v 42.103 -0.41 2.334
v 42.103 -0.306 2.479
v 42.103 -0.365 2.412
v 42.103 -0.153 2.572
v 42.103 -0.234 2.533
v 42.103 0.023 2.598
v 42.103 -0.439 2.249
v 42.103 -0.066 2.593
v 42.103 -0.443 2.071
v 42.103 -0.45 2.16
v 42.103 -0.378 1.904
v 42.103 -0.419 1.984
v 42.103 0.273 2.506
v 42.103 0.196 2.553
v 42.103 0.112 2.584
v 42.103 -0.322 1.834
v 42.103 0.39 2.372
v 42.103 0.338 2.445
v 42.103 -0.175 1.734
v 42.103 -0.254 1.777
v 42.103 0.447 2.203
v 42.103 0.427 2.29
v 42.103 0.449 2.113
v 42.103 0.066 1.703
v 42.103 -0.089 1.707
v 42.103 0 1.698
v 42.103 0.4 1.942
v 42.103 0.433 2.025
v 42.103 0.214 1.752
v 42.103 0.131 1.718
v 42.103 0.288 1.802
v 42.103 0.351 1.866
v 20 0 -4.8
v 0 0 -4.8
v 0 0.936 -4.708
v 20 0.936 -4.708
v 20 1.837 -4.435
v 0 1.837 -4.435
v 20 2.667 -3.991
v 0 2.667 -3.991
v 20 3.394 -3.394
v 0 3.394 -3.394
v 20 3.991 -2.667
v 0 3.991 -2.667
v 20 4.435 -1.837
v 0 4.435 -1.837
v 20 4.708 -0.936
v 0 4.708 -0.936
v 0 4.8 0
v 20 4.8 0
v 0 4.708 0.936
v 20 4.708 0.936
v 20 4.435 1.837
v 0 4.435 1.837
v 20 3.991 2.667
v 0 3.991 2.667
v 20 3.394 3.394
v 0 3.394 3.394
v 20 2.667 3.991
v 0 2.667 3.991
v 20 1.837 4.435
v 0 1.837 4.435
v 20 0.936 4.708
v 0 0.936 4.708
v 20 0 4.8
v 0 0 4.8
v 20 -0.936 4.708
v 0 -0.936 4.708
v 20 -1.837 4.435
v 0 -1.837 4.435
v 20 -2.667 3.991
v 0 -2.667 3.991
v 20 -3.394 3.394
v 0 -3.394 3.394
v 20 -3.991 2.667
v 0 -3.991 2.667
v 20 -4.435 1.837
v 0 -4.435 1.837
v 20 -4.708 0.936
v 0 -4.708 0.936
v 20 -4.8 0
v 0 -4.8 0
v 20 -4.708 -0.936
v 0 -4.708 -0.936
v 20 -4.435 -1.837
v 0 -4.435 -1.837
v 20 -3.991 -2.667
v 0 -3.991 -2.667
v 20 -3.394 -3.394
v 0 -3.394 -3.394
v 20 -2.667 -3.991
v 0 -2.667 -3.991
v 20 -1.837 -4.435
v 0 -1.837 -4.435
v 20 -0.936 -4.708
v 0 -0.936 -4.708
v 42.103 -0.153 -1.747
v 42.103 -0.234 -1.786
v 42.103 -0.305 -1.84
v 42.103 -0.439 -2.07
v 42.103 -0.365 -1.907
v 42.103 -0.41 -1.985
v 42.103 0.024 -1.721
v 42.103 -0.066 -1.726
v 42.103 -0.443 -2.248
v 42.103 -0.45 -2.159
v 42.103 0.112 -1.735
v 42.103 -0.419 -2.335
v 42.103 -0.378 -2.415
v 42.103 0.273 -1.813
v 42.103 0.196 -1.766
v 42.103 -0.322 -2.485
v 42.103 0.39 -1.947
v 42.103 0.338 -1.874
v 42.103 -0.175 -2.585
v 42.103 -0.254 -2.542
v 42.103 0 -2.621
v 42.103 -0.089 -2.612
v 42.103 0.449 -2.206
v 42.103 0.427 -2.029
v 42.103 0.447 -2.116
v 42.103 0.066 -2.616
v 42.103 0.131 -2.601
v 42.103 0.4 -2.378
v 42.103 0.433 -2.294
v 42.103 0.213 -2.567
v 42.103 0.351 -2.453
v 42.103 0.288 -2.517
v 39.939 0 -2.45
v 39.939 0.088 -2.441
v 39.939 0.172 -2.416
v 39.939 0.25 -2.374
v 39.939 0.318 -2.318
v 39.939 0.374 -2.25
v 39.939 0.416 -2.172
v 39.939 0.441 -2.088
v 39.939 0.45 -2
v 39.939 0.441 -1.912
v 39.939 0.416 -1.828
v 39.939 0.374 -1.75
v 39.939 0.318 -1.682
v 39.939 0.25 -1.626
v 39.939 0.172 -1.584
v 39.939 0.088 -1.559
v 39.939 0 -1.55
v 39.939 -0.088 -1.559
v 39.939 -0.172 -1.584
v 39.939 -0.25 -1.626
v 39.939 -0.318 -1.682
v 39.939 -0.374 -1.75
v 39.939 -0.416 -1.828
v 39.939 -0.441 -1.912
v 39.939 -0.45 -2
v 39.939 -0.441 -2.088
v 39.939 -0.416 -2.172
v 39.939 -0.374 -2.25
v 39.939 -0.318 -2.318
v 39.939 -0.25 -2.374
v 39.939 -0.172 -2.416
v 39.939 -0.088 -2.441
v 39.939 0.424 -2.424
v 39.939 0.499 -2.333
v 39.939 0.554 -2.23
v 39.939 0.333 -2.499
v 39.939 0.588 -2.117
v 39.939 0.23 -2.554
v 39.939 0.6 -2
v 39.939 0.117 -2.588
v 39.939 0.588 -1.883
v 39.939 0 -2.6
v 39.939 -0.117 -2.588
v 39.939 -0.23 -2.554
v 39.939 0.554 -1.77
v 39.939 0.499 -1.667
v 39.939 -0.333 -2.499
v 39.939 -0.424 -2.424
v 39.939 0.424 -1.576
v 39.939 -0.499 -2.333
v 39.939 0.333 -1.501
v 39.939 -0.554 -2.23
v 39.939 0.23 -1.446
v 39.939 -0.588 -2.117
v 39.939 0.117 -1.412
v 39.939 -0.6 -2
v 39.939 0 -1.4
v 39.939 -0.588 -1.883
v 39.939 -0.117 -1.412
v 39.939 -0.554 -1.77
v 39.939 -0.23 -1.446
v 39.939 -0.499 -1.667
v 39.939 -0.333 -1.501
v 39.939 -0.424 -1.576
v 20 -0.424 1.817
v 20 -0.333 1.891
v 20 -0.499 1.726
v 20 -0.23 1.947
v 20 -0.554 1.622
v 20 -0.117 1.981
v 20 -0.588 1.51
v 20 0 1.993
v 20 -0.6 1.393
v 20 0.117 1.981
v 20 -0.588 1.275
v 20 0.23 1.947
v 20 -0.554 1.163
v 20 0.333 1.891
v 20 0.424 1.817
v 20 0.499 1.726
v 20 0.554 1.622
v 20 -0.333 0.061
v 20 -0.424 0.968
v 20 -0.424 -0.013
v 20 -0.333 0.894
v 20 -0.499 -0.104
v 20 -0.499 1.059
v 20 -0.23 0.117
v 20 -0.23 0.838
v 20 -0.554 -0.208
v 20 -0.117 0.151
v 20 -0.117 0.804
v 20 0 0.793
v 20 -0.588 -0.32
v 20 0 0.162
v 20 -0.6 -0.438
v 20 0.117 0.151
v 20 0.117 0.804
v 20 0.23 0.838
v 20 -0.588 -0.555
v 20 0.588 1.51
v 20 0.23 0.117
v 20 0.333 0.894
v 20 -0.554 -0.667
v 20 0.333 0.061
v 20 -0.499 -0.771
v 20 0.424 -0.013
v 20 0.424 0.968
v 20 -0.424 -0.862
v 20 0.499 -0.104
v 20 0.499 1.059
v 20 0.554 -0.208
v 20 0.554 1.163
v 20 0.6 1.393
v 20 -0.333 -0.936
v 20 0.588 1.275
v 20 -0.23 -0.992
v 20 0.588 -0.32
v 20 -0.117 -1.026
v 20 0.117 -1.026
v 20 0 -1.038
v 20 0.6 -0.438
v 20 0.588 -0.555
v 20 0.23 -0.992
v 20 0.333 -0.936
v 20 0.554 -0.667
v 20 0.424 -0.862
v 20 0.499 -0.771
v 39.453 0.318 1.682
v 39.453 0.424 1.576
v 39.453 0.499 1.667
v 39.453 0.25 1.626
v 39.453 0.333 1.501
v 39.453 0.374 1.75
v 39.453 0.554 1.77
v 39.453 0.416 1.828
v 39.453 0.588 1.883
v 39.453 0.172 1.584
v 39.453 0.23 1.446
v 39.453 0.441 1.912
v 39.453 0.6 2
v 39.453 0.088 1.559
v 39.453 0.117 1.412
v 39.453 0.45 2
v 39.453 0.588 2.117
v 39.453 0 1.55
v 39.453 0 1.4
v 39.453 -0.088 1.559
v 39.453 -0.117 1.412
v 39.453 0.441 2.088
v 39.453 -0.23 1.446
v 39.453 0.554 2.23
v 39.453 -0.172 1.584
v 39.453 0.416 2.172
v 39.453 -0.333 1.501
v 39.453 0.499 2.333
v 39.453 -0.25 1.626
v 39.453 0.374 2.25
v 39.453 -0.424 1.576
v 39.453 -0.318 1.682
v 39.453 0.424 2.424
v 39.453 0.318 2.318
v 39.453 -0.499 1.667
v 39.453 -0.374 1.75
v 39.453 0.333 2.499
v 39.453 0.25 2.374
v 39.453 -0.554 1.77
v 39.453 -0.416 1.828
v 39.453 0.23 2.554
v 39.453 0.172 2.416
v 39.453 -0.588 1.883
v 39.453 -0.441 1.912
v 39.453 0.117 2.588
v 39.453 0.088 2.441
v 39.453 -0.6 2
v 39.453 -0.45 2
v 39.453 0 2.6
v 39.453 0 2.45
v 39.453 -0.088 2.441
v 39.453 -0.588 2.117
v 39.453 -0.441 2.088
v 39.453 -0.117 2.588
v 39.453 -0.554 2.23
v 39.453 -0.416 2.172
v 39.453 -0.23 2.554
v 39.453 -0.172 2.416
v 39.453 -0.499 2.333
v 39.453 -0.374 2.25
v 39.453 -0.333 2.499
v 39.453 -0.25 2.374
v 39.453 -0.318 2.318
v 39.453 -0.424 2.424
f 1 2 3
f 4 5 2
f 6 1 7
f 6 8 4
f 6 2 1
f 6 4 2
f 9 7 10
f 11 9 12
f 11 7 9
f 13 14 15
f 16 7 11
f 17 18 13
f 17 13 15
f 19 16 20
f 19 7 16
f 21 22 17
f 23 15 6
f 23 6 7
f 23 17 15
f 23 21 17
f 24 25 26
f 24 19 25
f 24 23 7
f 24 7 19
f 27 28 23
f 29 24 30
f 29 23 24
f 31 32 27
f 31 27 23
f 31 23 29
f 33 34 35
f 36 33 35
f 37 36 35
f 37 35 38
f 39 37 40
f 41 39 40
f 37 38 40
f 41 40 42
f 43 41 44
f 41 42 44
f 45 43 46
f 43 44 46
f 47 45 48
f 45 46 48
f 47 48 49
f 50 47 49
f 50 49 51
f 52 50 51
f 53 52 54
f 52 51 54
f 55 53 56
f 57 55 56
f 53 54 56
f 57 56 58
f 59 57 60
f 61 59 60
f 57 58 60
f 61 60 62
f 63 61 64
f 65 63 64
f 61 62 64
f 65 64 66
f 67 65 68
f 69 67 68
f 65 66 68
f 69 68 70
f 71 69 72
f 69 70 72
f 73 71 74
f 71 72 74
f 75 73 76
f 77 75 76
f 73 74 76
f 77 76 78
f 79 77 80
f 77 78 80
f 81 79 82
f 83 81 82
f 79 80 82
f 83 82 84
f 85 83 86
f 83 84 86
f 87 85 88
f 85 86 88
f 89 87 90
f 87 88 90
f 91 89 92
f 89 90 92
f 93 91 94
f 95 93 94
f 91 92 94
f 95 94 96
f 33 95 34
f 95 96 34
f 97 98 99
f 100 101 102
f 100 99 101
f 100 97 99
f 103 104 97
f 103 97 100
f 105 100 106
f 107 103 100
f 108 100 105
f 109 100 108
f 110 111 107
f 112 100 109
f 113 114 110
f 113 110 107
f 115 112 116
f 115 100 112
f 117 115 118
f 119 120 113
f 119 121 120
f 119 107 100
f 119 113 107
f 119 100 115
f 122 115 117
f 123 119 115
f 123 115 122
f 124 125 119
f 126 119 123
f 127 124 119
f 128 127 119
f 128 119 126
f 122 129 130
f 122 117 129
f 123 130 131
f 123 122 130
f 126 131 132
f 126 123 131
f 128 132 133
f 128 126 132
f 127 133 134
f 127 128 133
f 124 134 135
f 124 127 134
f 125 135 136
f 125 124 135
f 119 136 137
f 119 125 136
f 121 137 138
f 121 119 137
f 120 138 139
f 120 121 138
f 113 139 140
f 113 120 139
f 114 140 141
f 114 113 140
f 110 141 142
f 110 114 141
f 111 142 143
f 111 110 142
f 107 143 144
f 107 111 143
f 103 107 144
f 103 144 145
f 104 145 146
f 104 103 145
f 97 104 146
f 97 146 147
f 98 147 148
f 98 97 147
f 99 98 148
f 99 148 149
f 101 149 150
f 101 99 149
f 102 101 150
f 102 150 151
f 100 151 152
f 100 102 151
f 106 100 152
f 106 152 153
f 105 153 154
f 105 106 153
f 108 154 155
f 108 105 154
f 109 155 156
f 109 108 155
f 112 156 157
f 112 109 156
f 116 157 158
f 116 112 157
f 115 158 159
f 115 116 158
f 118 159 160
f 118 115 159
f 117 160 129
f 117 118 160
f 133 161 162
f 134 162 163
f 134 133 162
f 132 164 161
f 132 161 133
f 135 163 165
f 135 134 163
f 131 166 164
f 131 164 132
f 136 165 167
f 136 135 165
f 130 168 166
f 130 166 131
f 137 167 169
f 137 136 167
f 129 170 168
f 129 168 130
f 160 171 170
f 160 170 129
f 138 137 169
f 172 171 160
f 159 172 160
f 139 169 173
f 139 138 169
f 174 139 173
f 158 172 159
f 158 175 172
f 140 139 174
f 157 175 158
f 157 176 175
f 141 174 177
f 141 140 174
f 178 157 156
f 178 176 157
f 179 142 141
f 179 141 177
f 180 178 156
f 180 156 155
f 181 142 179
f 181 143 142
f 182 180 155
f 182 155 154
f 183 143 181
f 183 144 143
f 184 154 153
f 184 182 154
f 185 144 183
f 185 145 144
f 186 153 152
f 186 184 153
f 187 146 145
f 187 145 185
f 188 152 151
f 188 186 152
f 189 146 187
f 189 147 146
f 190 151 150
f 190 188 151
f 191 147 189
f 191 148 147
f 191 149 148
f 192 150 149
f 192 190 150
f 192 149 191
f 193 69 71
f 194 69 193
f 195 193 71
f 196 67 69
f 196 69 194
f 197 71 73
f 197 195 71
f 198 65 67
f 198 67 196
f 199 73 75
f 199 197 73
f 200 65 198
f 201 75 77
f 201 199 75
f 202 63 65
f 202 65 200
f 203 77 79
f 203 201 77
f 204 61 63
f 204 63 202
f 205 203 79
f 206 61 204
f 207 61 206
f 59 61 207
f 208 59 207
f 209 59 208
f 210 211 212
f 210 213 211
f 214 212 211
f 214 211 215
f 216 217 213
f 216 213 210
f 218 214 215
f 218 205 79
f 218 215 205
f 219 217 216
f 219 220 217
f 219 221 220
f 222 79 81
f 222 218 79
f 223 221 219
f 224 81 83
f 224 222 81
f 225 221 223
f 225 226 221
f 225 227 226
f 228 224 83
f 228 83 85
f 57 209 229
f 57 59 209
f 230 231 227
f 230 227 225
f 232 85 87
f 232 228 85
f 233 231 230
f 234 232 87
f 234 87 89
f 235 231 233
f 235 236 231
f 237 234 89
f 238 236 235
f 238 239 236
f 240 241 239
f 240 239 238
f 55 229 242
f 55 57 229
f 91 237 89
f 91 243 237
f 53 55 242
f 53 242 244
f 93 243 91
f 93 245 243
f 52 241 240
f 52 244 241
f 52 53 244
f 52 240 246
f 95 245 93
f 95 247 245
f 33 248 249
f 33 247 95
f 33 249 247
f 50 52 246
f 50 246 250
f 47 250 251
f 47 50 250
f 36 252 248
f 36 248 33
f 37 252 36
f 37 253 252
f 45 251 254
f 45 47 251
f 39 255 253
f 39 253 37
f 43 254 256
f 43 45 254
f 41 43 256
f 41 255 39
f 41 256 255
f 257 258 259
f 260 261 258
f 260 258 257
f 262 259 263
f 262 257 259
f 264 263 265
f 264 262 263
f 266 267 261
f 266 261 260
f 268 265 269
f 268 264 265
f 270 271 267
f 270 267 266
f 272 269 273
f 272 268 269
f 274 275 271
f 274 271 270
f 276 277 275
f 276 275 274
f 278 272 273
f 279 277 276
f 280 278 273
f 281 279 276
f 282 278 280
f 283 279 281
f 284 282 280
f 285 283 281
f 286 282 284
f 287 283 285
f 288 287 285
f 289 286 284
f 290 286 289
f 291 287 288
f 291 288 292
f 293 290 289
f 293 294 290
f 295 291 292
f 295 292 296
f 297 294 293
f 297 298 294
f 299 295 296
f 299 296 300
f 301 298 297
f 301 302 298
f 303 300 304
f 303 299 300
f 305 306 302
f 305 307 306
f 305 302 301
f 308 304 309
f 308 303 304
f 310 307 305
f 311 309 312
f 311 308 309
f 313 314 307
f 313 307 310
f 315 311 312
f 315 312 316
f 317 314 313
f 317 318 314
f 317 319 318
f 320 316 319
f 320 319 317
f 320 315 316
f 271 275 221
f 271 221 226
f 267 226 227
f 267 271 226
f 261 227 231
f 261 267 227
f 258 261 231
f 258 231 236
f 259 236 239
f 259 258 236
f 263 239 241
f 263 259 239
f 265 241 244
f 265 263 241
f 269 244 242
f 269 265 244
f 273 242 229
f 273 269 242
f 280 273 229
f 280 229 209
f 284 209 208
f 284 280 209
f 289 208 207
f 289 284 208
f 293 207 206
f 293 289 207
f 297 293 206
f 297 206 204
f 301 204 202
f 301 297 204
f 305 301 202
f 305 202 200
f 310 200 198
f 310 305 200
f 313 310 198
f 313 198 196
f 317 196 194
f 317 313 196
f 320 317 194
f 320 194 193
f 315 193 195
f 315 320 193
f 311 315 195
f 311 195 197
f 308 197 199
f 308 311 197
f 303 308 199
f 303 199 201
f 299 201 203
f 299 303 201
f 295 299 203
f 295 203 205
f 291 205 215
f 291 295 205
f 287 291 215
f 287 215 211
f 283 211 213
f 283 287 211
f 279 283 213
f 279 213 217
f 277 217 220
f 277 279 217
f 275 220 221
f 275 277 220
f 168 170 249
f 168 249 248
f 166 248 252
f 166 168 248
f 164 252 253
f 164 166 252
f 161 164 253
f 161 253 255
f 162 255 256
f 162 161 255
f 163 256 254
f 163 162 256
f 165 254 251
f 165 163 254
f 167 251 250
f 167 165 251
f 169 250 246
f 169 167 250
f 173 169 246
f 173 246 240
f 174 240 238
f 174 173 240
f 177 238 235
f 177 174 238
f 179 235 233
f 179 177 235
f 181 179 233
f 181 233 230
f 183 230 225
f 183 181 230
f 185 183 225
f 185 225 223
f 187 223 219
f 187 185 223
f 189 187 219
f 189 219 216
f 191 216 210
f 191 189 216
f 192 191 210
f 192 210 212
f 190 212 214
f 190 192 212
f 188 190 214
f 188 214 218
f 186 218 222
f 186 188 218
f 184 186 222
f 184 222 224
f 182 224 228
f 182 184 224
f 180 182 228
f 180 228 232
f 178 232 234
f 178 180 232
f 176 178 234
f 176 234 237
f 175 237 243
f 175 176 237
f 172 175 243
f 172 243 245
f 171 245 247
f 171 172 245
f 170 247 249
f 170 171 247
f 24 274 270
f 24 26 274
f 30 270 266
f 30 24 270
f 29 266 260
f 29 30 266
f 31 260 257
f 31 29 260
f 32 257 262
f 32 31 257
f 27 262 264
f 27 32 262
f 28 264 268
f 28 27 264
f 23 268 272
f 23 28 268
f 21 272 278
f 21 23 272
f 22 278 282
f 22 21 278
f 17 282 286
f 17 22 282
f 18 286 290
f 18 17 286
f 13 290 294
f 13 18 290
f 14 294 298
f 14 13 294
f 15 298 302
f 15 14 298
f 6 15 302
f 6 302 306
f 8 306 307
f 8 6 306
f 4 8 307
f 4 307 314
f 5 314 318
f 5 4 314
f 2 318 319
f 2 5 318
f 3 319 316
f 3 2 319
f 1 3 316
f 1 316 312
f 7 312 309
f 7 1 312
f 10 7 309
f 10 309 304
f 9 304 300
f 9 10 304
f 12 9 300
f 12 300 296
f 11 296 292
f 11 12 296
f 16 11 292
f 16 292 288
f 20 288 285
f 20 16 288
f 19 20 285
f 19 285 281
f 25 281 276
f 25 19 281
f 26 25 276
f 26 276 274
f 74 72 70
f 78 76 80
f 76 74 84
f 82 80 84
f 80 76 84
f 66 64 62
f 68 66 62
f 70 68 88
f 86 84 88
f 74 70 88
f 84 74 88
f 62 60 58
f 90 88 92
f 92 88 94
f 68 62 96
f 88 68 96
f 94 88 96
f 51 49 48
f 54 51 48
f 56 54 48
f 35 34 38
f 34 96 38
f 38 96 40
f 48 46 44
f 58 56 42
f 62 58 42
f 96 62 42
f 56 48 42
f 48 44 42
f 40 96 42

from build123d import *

# Parameters (mm, degrees)
SKETCH1_R      = 4.8
TUBE_DEPTH     = 20
SKETCH3_R      = 0.6
SKETCH6_R      = 0.6
SKETCH9_R      = 0.45
SKETCH10_R     = 0.45
SKETCH11_W     = 12.950895794
SKETCH11_H     = 9.583916724
WIRE_CUT_DEPTH = 5


with BuildPart() as part:
    # Sketch1 → Tube (new body)
    with BuildSketch(Plane(origin=(0, 0, 0), x_dir=(0, 0, -1), z_dir=(1, 0, 0))):
        Circle(SKETCH1_R)
    extrude(amount=TUBE_DEPTH)

    # Sweep1: sweep along a path in Sketch2
    with BuildLine(Plane(origin=(0, 0, 0), x_dir=(1, 0, 0), z_dir=(0, 1, 0))) as sweep1_path:
        Line((20, 0.437533256), (39.938874032, 2))
    # Sketch3 → Sweep1 (sweep)
    with BuildSketch(Plane(origin=(20, 0, 0), x_dir=(0, 0, -1), z_dir=(1, 0, 0))):
        with Locations((0.437533256, 0)):
            Circle(SKETCH3_R)
    sweep(path=sweep1_path.line)

    # Sweep2: sweep along a path in Sketch5
    with BuildLine(Plane(origin=(0, 0, 0), x_dir=(1, 0, 0), z_dir=(0, 1, 0))) as sweep2_path:
        Line((20, -1.392543459), (39.452849812, -2))
    # Sketch6 → Sweep2 (sweep)
    with BuildSketch(Plane(origin=(20, 0, 0), x_dir=(0, 0, -1), z_dir=(1, 0, 0))):
        with Locations((-1.392543459, 0)):
            Circle(SKETCH6_R)
    sweep(path=sweep2_path.line)

    # ca: sweep along a path in Sketch7
    with BuildLine(Plane(origin=(0, 0, 0), x_dir=(1, 0, 0), z_dir=(0, 1, 0))) as ca_path:
        Line((39.938874032, 2), (52.603130391, 2.998856902))
    # Sketch9 → ca (sweep)
    with BuildSketch(Plane(origin=(39.938874032, 0, 0), x_dir=(0, 0, -1), z_dir=(1, 0, 0))):
        with Locations((2, 0)):
            Circle(SKETCH9_R)
    sweep(path=ca_path.line)

    # an: sweep along a path in Sketch8
    with BuildLine(Plane(origin=(0, 0, 0), x_dir=(1, 0, 0), z_dir=(0, 1, 0))) as an_path:
        Line((39.452849812, -2), (53.102297824, -2.764258006))
    # Sketch10 → an (sweep)
    with BuildSketch(Plane(origin=(39.452849812, 0, 0), x_dir=(0, 0, -1), z_dir=(1, 0, 0))):
        with Locations((-2, 0)):
            Circle(SKETCH10_R)
    sweep(path=an_path.line)

    # Sketch11 → wire cut (cut, symmetric)
    with BuildSketch(Plane(origin=(0, 0, 0), x_dir=(1, 0, 0), z_dir=(0, 1, 0))):
        with Locations((48.578158556, -0.027699181)):
            Rectangle(SKETCH11_W, SKETCH11_H)
    extrude(amount=WIRE_CUT_DEPTH, both=True, mode=Mode.SUBTRACT)


solid = part.part
